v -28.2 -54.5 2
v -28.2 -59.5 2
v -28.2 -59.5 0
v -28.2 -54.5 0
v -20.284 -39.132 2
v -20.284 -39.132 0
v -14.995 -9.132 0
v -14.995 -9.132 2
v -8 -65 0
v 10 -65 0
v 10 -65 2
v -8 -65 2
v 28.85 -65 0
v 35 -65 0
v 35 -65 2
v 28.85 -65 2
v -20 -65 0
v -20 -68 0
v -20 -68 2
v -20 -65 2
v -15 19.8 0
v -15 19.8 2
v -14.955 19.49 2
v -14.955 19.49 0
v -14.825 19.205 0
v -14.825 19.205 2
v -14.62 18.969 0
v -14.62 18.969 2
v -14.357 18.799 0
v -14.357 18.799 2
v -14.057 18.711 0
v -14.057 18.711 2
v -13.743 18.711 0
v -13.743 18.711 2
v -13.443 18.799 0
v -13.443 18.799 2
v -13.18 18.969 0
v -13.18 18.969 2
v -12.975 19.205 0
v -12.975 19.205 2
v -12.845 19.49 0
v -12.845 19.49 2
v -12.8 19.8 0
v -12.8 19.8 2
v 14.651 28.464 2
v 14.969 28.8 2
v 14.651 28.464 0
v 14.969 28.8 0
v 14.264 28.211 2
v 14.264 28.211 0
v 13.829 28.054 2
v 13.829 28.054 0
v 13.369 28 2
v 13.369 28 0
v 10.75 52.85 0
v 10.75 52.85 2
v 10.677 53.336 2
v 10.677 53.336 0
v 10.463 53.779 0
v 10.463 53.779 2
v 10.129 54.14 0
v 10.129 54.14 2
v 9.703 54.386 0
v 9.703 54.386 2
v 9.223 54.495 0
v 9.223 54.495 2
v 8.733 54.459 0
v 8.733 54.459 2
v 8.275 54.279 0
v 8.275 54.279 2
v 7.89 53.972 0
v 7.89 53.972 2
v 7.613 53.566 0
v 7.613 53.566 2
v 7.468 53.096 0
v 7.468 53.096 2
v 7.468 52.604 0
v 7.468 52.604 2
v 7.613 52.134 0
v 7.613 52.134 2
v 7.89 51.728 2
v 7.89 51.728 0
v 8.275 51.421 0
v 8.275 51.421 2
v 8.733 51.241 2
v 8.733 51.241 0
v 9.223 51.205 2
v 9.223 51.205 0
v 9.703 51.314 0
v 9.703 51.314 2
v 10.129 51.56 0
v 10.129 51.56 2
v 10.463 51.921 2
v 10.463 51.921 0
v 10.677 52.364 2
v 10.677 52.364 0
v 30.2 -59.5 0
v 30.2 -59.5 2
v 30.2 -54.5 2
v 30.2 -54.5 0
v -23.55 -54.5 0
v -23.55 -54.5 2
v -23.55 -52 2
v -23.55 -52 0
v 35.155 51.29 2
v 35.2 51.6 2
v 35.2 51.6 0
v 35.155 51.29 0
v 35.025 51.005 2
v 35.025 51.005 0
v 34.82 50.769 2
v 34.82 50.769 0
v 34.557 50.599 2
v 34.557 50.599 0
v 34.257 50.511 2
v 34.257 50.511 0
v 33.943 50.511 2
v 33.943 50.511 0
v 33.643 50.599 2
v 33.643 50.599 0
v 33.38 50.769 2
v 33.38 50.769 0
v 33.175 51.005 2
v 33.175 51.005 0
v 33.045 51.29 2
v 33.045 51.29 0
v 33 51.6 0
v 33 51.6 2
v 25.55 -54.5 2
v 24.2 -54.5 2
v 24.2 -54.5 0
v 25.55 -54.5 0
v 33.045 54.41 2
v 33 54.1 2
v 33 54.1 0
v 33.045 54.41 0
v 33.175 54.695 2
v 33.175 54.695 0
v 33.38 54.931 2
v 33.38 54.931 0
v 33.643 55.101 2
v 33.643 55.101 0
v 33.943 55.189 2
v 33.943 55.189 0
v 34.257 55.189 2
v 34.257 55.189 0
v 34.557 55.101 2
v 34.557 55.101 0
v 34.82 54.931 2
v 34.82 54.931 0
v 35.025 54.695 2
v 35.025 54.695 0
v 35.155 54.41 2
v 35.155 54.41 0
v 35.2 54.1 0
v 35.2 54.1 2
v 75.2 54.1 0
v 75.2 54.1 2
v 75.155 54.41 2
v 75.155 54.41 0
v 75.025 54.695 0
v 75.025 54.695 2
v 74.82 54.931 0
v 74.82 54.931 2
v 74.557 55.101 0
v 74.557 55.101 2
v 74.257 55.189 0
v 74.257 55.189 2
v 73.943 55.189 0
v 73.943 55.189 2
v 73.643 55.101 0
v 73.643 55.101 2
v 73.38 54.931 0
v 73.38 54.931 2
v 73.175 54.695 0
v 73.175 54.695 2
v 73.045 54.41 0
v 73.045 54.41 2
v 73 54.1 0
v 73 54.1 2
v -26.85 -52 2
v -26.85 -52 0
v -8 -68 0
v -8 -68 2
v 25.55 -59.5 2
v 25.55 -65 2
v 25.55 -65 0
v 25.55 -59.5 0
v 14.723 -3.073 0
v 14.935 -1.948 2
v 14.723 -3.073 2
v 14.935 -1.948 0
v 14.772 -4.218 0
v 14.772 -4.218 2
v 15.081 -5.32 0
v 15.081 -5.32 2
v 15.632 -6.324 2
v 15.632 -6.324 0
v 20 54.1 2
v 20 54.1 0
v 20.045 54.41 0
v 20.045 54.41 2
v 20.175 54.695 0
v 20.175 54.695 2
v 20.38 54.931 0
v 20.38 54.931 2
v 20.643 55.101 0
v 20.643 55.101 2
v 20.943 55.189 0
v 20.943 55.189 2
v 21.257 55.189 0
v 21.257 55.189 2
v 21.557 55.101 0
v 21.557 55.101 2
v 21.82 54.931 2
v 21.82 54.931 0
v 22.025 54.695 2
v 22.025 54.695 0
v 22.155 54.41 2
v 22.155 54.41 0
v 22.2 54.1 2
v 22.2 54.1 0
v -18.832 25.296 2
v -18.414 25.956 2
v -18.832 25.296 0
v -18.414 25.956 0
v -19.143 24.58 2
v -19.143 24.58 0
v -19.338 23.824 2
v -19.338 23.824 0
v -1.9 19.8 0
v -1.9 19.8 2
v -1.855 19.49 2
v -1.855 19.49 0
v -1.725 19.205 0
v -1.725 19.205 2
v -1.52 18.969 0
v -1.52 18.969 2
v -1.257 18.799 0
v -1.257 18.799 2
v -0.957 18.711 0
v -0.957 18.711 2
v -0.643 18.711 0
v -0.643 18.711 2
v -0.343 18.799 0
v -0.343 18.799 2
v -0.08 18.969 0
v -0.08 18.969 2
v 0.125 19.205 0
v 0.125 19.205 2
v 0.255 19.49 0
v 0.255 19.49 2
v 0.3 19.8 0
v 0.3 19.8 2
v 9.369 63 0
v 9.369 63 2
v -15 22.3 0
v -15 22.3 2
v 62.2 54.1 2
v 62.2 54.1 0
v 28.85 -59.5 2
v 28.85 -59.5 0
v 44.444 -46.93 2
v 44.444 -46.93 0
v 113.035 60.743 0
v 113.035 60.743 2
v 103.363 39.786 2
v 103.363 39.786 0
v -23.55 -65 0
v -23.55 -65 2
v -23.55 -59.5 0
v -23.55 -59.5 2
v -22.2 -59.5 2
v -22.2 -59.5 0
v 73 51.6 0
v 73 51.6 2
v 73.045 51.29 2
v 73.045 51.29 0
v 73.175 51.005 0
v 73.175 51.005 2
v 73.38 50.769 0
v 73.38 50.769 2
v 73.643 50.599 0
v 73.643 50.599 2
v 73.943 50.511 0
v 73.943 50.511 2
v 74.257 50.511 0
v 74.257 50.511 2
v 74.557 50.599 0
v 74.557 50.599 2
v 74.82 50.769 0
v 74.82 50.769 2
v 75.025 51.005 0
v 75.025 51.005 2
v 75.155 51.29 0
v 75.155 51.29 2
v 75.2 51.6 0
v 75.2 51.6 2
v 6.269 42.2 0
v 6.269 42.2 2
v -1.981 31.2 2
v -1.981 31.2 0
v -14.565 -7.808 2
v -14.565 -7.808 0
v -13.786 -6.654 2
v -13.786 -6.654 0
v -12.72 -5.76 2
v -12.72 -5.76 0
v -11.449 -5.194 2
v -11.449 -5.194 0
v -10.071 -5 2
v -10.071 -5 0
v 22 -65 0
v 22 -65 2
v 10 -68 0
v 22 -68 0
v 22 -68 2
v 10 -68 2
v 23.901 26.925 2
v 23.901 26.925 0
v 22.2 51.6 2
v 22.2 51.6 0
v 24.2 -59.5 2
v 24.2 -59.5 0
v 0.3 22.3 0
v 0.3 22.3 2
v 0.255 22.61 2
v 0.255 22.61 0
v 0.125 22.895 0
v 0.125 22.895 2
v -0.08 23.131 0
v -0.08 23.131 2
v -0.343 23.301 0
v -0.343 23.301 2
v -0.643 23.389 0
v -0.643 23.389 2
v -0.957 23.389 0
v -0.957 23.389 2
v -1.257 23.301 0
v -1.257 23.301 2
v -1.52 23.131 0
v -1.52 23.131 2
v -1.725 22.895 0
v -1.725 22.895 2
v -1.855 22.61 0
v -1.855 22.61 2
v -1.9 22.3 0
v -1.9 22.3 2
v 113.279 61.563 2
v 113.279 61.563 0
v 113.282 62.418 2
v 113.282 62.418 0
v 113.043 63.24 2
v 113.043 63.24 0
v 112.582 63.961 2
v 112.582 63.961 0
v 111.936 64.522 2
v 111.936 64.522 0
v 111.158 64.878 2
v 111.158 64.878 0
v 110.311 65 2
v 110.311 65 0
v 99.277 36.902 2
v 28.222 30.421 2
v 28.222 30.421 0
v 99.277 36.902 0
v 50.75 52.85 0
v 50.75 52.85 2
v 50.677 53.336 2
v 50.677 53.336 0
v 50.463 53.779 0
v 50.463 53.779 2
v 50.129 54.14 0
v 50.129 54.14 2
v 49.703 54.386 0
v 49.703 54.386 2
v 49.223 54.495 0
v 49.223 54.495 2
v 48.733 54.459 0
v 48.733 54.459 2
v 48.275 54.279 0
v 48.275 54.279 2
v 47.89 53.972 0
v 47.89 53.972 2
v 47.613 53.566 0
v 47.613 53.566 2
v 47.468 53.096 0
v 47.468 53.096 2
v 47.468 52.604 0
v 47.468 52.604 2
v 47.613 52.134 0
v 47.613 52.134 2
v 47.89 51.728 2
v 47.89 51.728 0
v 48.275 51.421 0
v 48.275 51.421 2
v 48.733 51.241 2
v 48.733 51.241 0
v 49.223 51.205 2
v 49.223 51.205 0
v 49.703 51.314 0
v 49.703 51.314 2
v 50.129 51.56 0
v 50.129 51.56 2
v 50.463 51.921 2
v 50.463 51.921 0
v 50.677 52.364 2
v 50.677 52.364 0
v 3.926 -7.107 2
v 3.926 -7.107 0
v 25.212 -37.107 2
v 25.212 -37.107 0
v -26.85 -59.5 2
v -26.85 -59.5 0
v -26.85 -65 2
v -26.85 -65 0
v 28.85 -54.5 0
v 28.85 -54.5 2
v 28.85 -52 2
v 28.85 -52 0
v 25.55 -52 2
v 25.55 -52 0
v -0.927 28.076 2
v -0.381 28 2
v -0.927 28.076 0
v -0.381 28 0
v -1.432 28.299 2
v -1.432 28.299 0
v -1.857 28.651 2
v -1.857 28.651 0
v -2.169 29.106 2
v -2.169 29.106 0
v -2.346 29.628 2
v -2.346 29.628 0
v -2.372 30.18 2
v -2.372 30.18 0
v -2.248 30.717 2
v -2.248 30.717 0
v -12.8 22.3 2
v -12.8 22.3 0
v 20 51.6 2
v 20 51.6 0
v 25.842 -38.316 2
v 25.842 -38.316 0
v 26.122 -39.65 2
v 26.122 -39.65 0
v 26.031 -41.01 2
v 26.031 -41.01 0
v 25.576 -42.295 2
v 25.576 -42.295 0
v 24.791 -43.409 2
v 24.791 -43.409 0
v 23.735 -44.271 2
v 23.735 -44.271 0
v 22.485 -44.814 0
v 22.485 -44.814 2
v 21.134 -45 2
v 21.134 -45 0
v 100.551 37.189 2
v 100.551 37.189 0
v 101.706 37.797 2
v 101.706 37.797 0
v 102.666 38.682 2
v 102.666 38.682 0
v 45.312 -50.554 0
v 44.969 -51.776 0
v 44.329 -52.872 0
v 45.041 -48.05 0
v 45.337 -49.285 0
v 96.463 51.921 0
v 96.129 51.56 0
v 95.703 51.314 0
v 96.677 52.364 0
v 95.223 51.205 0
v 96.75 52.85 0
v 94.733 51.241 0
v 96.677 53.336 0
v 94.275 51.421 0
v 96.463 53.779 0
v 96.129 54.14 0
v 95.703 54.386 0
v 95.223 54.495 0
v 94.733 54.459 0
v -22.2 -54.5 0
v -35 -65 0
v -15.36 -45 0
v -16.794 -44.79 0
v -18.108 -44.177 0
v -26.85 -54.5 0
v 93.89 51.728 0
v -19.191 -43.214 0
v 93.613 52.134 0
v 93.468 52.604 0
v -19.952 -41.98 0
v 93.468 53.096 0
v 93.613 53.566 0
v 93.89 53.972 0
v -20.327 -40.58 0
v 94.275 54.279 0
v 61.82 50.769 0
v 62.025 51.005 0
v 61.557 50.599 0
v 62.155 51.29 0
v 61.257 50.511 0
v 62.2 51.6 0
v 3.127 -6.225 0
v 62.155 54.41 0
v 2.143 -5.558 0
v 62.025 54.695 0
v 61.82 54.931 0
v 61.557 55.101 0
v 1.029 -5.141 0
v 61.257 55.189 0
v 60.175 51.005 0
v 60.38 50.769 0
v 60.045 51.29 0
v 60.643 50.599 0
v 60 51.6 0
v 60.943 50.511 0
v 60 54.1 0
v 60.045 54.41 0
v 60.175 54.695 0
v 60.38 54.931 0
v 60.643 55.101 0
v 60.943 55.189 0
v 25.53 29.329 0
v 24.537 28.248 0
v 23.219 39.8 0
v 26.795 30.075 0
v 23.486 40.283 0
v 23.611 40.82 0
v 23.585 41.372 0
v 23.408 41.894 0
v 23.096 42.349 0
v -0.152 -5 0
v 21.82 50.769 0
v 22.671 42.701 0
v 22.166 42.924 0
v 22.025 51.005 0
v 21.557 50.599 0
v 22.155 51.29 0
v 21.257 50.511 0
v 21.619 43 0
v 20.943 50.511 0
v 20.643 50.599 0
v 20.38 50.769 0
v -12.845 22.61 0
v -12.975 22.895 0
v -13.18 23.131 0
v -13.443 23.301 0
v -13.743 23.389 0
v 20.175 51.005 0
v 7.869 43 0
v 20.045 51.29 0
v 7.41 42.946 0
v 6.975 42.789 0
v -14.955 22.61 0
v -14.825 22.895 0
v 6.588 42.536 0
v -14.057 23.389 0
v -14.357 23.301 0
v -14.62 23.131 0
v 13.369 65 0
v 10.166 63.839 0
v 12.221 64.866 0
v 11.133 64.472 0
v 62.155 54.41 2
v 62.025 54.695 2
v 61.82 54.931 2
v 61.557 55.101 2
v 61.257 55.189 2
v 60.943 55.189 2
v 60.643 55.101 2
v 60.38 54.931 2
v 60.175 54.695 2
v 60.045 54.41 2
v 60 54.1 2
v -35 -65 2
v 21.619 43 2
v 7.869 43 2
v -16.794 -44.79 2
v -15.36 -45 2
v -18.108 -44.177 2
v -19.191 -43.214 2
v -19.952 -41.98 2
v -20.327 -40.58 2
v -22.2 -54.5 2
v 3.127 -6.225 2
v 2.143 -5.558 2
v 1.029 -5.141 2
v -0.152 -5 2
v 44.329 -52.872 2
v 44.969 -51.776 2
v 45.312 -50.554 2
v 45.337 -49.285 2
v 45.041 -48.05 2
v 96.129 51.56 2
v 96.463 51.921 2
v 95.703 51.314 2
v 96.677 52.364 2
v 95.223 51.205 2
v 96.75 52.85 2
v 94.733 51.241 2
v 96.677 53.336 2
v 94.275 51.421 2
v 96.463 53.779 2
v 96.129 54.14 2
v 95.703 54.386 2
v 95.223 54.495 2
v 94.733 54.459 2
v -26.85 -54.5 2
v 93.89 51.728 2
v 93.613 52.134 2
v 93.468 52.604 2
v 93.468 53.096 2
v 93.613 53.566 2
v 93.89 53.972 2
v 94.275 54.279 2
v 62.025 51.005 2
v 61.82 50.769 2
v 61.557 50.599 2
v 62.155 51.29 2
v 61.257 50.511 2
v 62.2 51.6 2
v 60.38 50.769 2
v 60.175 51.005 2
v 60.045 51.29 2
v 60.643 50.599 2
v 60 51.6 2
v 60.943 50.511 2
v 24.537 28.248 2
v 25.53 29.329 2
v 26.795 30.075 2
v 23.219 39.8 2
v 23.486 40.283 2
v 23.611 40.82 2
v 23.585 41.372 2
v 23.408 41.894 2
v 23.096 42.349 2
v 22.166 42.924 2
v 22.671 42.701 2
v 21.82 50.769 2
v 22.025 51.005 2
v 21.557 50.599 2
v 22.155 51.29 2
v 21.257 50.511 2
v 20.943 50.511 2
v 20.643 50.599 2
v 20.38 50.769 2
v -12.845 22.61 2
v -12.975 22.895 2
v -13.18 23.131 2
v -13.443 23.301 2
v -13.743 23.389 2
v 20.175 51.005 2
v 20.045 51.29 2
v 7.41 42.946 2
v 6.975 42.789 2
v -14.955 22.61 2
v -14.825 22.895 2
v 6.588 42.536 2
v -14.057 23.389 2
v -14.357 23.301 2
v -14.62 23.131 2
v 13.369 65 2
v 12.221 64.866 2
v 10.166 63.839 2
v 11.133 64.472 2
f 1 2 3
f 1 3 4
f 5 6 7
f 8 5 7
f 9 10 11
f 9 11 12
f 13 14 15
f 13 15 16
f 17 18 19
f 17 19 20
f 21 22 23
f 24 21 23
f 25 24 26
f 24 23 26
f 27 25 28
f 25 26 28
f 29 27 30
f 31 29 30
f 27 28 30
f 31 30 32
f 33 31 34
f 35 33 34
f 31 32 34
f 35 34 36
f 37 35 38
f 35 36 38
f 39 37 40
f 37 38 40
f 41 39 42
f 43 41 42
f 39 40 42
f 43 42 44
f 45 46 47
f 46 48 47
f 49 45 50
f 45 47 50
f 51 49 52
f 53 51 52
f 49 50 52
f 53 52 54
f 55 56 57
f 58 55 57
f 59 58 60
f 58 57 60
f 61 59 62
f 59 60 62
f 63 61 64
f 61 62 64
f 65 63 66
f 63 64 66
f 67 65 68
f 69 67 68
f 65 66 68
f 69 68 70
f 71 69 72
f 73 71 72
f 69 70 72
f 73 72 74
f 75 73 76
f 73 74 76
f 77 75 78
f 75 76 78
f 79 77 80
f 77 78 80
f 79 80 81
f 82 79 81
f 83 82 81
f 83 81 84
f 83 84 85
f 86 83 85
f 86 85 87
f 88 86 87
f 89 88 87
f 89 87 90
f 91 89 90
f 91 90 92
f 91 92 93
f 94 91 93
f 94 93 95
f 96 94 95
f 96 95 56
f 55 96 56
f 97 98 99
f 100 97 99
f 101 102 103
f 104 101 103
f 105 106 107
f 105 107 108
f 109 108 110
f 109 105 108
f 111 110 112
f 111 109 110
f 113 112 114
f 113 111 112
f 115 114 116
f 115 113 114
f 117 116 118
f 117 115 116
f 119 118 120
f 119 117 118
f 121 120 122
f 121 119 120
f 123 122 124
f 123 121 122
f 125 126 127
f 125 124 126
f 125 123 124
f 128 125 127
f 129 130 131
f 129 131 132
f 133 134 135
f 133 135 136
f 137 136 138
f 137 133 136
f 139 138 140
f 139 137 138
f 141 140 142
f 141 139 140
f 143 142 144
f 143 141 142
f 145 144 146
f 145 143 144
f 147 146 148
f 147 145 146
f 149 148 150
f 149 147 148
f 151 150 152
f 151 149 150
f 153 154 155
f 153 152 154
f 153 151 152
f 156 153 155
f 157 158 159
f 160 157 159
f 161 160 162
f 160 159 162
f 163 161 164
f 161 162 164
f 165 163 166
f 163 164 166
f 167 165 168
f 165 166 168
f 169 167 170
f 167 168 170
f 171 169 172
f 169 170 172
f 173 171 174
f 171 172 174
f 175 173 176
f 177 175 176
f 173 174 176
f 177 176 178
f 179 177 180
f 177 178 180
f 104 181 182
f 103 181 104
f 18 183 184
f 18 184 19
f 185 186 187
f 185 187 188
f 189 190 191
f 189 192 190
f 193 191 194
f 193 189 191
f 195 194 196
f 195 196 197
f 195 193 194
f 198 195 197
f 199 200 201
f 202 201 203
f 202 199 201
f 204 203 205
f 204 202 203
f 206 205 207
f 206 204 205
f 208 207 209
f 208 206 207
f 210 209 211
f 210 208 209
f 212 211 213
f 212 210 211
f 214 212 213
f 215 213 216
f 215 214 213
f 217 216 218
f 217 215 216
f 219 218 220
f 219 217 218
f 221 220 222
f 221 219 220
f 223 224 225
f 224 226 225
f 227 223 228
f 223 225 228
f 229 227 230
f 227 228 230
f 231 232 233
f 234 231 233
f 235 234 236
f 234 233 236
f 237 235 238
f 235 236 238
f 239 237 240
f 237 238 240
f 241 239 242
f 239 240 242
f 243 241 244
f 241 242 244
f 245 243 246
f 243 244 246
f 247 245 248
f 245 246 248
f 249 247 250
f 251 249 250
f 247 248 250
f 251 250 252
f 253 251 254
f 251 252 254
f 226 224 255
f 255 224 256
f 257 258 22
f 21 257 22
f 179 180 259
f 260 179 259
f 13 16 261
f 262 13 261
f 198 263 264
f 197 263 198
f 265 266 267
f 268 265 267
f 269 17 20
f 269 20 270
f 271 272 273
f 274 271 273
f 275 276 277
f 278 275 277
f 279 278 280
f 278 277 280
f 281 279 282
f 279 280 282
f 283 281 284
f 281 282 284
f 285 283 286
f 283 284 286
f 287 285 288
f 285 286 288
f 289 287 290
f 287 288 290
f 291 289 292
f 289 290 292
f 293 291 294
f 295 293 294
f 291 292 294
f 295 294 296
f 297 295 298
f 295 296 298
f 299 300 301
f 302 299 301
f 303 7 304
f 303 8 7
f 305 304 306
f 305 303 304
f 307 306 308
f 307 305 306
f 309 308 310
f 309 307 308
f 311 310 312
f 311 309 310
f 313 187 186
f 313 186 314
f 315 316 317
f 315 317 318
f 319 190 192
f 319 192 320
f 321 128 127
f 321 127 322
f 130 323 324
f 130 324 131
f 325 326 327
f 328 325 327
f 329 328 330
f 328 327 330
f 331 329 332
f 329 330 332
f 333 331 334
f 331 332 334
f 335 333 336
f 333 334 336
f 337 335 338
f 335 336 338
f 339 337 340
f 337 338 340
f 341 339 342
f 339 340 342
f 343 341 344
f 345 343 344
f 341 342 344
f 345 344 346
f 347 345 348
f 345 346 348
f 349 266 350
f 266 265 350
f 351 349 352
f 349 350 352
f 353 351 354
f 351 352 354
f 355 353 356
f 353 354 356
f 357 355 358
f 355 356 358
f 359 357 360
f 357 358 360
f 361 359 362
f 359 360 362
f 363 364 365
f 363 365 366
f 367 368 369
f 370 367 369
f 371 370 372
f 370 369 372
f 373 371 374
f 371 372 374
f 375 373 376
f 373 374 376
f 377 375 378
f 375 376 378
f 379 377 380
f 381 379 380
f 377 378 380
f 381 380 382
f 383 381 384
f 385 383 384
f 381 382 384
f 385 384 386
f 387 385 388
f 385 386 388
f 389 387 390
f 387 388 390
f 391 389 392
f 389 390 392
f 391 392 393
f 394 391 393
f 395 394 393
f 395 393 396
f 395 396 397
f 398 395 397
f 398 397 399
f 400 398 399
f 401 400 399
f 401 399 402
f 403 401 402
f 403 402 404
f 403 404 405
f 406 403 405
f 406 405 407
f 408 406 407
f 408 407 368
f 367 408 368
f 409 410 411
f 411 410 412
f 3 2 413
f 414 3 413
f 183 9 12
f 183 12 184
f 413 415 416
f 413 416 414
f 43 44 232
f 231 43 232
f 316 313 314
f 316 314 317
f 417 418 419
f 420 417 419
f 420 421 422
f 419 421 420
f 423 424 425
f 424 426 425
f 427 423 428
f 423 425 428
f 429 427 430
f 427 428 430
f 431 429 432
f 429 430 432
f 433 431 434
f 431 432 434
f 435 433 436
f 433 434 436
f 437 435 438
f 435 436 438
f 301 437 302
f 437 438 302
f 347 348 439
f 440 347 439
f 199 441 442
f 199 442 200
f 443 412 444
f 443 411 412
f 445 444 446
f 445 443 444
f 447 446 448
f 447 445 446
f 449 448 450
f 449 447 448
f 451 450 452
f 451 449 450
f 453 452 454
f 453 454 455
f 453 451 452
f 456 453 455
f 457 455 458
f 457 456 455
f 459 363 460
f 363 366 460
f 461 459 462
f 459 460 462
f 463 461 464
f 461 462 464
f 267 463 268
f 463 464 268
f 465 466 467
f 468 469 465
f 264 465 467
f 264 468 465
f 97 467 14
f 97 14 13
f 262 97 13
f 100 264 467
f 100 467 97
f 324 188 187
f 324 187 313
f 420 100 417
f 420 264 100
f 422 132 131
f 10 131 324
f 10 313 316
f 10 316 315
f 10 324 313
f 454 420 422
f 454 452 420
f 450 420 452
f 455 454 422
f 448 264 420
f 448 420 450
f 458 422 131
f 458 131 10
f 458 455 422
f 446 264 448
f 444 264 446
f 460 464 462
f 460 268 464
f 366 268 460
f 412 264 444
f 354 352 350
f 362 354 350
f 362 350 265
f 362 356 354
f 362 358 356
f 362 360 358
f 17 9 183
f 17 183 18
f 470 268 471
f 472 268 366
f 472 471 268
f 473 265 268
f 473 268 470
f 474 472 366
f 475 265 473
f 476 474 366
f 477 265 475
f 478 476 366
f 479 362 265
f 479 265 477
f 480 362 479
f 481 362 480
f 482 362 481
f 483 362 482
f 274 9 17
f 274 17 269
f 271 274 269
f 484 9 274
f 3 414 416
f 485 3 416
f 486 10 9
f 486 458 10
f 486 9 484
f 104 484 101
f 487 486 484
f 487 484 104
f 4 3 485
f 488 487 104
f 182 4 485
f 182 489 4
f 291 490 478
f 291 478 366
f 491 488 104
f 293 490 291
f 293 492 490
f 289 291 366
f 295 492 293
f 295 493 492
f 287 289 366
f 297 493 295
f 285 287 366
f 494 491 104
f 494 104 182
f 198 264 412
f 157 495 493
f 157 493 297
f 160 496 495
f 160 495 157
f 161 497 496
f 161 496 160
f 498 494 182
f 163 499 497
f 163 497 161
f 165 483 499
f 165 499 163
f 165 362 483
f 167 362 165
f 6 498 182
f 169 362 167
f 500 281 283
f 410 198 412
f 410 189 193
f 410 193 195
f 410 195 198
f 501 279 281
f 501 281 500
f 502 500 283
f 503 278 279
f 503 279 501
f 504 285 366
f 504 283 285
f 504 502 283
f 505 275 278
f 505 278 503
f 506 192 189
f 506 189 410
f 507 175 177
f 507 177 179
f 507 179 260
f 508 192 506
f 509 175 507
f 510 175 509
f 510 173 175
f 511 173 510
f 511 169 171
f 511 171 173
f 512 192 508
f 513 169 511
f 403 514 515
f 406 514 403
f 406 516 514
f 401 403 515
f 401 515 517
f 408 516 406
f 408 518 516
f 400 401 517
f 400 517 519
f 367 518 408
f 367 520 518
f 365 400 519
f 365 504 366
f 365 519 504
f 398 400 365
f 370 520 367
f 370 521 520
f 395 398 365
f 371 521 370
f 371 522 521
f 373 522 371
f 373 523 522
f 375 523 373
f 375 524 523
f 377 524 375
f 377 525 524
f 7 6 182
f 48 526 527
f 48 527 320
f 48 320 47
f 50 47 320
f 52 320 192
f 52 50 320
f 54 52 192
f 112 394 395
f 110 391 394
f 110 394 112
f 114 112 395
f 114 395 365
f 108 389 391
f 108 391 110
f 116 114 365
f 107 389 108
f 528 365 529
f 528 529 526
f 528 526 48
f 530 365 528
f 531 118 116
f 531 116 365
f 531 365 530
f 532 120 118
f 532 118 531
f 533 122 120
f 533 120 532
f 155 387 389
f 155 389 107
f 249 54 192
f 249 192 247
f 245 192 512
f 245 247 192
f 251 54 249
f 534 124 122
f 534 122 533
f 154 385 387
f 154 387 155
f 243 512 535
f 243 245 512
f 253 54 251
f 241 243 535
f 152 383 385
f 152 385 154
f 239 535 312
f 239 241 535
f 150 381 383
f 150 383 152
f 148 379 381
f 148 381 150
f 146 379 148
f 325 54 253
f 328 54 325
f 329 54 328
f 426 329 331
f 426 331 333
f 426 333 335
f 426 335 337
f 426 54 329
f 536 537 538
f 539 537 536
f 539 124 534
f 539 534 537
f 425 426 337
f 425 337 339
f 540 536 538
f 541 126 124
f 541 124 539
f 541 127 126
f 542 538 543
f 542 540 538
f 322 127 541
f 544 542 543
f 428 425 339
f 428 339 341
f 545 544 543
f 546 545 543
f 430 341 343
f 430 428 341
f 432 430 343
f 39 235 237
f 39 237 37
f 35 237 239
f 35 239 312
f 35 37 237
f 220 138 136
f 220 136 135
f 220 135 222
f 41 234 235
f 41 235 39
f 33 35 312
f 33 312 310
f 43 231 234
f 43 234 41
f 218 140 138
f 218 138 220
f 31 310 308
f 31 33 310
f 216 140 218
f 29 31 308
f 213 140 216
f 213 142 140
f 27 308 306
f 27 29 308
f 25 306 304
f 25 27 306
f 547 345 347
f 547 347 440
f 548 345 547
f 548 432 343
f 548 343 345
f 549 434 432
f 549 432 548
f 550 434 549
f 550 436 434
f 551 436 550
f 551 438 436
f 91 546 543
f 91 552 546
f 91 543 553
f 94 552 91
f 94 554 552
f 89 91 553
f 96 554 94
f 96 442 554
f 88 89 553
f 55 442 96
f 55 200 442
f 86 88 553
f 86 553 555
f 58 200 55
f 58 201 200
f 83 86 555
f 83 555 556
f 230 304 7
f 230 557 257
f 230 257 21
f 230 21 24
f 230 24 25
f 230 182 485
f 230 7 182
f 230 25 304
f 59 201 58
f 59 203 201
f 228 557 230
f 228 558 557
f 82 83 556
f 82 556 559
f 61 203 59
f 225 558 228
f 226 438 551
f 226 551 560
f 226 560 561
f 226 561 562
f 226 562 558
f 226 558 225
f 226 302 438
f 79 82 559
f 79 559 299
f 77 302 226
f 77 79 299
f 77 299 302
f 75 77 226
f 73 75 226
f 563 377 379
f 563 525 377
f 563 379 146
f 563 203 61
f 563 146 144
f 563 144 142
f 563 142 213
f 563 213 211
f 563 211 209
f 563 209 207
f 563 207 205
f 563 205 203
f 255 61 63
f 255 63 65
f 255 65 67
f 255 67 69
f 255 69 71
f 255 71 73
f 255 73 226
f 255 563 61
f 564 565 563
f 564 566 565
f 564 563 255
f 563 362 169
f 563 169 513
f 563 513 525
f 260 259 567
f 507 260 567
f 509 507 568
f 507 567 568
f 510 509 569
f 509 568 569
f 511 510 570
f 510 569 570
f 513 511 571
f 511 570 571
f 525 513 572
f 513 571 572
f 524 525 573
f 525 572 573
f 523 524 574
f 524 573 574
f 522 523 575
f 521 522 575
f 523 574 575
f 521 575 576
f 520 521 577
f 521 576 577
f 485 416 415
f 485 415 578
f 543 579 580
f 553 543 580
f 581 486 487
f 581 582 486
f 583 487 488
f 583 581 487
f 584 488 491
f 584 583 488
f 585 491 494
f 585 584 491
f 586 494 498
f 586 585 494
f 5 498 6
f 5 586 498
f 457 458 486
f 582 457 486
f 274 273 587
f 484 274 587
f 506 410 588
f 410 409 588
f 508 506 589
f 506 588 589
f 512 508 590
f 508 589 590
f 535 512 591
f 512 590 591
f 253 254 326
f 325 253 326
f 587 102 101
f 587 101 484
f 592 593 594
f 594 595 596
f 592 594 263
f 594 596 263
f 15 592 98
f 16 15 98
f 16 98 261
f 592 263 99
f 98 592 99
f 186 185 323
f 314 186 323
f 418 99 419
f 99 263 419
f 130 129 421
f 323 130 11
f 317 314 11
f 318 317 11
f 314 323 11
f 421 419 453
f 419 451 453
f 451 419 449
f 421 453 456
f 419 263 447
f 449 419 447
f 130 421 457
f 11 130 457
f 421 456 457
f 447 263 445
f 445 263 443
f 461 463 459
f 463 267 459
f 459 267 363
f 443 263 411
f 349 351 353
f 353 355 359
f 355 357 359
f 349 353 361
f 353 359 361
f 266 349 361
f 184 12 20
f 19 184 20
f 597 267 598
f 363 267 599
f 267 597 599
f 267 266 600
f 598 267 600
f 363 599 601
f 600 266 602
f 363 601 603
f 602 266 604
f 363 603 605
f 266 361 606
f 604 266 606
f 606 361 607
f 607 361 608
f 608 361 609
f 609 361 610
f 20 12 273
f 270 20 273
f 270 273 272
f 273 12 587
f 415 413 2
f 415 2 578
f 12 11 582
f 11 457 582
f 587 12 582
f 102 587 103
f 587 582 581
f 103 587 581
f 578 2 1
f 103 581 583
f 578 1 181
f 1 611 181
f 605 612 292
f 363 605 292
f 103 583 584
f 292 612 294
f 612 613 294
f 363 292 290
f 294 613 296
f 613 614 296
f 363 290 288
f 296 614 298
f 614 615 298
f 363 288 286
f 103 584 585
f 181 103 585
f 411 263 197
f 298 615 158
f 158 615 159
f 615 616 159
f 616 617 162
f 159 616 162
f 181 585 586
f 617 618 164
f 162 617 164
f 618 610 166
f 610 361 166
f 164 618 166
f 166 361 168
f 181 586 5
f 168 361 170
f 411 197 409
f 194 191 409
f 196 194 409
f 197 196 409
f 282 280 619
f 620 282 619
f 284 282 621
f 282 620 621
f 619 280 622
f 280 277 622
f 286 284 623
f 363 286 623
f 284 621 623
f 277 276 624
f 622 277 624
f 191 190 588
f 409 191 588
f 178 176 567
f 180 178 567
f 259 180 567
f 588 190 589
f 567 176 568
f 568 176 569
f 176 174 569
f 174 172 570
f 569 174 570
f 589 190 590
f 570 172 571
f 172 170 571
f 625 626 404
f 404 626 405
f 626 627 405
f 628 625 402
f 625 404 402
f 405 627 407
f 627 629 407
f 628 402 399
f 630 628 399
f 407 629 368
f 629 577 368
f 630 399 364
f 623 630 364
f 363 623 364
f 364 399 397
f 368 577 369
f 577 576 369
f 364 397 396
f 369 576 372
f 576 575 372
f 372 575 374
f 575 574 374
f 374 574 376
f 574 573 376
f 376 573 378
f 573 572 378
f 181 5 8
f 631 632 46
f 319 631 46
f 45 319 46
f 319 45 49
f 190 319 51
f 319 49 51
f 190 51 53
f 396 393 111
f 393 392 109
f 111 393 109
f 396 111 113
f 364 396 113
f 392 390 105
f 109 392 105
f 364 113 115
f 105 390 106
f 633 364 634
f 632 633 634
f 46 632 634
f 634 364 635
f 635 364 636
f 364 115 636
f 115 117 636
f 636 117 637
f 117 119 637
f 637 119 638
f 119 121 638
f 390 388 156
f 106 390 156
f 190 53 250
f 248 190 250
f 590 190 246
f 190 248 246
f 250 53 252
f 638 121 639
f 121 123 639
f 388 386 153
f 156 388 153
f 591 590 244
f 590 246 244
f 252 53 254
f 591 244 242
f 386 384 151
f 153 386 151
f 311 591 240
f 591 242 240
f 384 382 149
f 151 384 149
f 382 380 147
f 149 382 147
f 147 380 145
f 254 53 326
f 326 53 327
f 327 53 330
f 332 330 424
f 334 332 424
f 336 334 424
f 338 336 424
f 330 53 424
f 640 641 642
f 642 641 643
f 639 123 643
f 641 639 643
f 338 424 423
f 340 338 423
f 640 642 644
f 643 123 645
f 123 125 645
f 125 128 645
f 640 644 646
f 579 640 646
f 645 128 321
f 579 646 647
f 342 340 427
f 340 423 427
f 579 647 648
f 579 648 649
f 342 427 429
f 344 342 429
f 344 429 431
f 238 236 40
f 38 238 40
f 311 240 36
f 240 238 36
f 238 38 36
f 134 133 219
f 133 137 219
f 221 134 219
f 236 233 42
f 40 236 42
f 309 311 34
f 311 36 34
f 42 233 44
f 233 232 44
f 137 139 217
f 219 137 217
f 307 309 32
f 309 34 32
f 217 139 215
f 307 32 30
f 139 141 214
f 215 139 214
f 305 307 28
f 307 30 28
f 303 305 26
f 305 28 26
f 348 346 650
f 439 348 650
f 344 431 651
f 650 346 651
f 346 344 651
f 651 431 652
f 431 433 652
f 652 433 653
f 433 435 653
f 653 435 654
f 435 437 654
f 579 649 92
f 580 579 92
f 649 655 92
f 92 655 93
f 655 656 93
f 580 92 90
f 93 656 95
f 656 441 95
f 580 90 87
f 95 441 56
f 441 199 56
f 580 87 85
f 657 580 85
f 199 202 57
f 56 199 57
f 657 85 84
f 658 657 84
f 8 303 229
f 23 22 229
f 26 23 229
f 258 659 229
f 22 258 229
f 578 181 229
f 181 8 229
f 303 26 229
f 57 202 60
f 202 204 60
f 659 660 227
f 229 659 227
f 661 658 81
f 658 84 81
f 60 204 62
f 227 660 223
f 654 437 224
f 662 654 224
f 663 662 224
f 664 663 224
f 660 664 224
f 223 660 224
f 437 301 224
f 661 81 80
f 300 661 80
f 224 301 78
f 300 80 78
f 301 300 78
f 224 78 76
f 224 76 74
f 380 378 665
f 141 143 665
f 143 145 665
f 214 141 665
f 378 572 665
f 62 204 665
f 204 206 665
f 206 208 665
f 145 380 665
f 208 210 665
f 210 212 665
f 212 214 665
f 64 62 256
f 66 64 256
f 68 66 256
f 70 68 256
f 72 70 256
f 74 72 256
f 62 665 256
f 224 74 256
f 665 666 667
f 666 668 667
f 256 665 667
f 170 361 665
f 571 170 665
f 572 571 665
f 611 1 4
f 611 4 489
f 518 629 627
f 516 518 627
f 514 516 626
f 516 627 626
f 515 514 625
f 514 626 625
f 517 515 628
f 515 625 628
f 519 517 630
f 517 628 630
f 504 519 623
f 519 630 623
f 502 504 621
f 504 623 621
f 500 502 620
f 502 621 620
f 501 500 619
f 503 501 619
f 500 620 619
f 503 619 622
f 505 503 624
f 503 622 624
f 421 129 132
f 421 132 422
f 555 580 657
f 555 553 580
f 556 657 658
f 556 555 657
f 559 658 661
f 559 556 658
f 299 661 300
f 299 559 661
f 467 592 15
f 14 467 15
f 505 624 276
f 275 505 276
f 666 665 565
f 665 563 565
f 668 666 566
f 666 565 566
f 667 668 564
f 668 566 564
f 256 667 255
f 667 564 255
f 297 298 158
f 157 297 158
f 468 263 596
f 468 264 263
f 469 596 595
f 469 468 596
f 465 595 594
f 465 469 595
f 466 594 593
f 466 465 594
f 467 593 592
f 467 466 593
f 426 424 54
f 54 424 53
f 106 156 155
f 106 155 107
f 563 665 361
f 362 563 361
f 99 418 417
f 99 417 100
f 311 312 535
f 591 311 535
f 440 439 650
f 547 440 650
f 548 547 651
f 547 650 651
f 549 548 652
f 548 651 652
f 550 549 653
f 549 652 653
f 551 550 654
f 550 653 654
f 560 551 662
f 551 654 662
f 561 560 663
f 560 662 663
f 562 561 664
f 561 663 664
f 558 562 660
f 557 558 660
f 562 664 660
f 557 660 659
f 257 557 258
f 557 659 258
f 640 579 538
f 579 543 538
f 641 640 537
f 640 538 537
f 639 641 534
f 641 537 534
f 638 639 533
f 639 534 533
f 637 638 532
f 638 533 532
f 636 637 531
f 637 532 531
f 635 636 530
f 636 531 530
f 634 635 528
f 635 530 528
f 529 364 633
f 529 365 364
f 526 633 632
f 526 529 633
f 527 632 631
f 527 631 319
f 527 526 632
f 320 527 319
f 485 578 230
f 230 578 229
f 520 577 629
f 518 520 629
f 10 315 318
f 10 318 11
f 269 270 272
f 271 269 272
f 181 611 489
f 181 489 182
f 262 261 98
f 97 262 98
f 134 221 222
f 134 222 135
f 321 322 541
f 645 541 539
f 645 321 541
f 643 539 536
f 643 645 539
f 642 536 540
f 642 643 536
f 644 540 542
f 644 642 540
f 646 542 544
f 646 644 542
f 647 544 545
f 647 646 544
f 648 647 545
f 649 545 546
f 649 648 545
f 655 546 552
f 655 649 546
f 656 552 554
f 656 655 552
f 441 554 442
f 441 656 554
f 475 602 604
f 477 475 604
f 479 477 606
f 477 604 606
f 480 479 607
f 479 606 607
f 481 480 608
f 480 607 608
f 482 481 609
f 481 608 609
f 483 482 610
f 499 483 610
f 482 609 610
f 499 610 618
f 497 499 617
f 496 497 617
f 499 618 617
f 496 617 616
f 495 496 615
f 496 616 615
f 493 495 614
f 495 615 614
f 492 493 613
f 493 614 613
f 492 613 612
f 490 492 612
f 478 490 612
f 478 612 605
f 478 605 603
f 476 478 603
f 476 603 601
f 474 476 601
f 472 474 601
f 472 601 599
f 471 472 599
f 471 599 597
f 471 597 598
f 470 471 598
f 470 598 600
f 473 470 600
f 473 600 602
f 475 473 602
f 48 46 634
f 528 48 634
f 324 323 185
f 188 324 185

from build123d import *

# Parameters (mm, degrees)
EXTRUDE_1_DEPTH      = 2
CUT_EXTRUDE_1_DEPTH  = 2
EXTRUDE_2_DEPTH      = 2
SKETCH_6_W           = 3.3
SKETCH_6_H           = 13
CUT_EXTRUDE_3_DEPTH  = 2
SKETCH_7_W           = 6
SKETCH_7_H           = 5
CUT_EXTRUDE_4_DEPTH  = 2
CUT_EXTRUDE_5_DEPTH  = 2
CUT_EXTRUDE_7_DEPTH  = 10
CUT_EXTRUDE_9_DEPTH  = 10
FILLET_1_R           = 5
CUT_EXTRUDE_10_DEPTH = 50
SKETCH_13_R          = 1.65
CUT_EXTRUDE_11_DEPTH = 50
FILLET_2_R           = 5
CUT_EXTRUDE_13_DEPTH = 50
FILLET_4_R           = 2
FILLET_5_R           = 3


with BuildPart() as part:
    # 草图1 → 凸台-拉伸1 (new body)
    with BuildSketch(Plane.XY):
        Polygon((-20, -65), (-35, -65), (-35, 65), (35, 65), (35, -65), (22, -65), (22, -68), (10, -68), (10, -65), (-8, -65), (-8, -68), (-20, -68), align=None)
    extrude(amount=EXTRUDE_1_DEPTH)

    # 草图2 → 切除-拉伸1 (cut)
    with BuildSketch(Plane.XY.offset(2)):
        Polygon((-35, -65), (-19.130571736, 25), (10.869428264, 65), (-35, 65), align=None)
    extrude(amount=-CUT_EXTRUDE_1_DEPTH, mode=Mode.SUBTRACT)

    # 草图3 → 凸台-拉伸2 (add)
    with BuildSketch(Plane.XY.offset(2)):
        Polygon((35, 65), (115, 65), (85, 0), (35, -65), align=None)
    extrude(amount=-EXTRUDE_2_DEPTH)

    # 草图6 → 切除-拉伸3 (cut)
    with BuildSketch(Plane.XY.offset(2)):
        with Locations((-25.2, -58.5)):
            Rectangle(SKETCH_6_W, SKETCH_6_H)
        with Locations((27.2, -58.5)):
            Rectangle(SKETCH_6_W, SKETCH_6_H)
    extrude(amount=-CUT_EXTRUDE_3_DEPTH, mode=Mode.SUBTRACT)

    # 草图7 → 切除-拉伸4 (cut)
    with BuildSketch(Plane.XY.offset(2)):
        with Locations((-25.2, -57)):
            Rectangle(SKETCH_7_W, SKETCH_7_H)
        with Locations((27.2, -57)):
            Rectangle(SKETCH_7_W, SKETCH_7_H)
    extrude(amount=-CUT_EXTRUDE_4_DEPTH, mode=Mode.SUBTRACT)

    # 草图8 → 切除-拉伸5 (cut)
    with BuildSketch(Plane.XY.offset(2)):
        Polygon((46.581829906, -49.943621123), (14.201899011, -4.308455167), (24.89214771, 30.117769456), (102.152743187, 37.164276905), (85, 0), align=None)
    extrude(amount=-CUT_EXTRUDE_5_DEPTH, mode=Mode.SUBTRACT)

    # 草图9 → 切除-拉伸7 (cut)
    with BuildSketch(Plane.XY.offset(2)):
        with BuildLine():
            Line((-12.8, 19.8), (-1.9, 19.8))
            ThreePointArc((-1.9, 19.8), (-0.8, 18.7), (0.3, 19.8))
            Line((0.3, 19.8), (0.3, 22.3))
            ThreePointArc((0.3, 22.3), (-0.8, 23.4), (-1.9, 22.3))
            Line((-1.9, 22.3), (-12.8, 22.3))
            ThreePointArc((-12.8, 22.3), (-13.9, 23.4), (-15, 22.3))
            Line((-15, 22.3), (-15, 19.8))
            ThreePointArc((-15, 19.8), (-13.9, 18.7), (-12.8, 19.8))
        make_face()
    extrude(amount=-CUT_EXTRUDE_7_DEPTH, mode=Mode.SUBTRACT)

    # 草图11 → 切除-拉伸9 (cut)
    with BuildSketch(Plane(origin=(0, 0, 0), x_dir=(-1, 0, 0), z_dir=(0, 0, -1))):
        Polygon((-2.431069725, -5), (-30.812630494, -45), (21.319194267, -45), (14.266115039, -5), align=None)
    extrude(amount=-CUT_EXTRUDE_9_DEPTH, mode=Mode.SUBTRACT)

    # 圆角1
    fillet_1_edges = [part.edges().sort_by_distance(p)[0] for p in [
        (46.581829906, -49.943621123, 1),
        (14.201899011, -4.308455167, 1),
        (24.89214771, 30.117769456, 1),
        (2.431069725, -5, 1),
        (-14.266115039, -5, 1),
        (-21.319194267, -45, 1),
        (30.812630494, -45, 1),
    ]]
    fillet(fillet_1_edges, radius=FILLET_1_R)

    # 草图12 → 切除-拉伸10 (cut)
    with BuildSketch(Plane.XY.offset(2)):
        with BuildLine():
            Line((22.2, 54.1), (33, 54.1))
            ThreePointArc((33, 54.1), (34.1, 55.2), (35.2, 54.1))
            Line((35.2, 54.1), (35.2, 51.6))
            ThreePointArc((35.2, 51.6), (34.1, 50.5), (33, 51.6))
            Line((33, 51.6), (22.2, 51.6))
            ThreePointArc((22.2, 51.6), (21.1, 50.5), (20, 51.6))
            Line((20, 51.6), (20, 54.1))
            ThreePointArc((20, 54.1), (21.1, 55.2), (22.2, 54.1))
        make_face()
        with BuildLine():
            Line((62.2, 51.6), (73, 51.6))
            ThreePointArc((73, 51.6), (74.1, 50.5), (75.2, 51.6))
            Line((75.2, 51.6), (75.2, 54.1))
            ThreePointArc((75.2, 54.1), (74.1, 55.2), (73, 54.1))
            Line((73, 54.1), (62.2, 54.1))
            ThreePointArc((62.2, 54.1), (61.1, 55.2), (60, 54.1))
            Line((60, 54.1), (60, 51.6))
            ThreePointArc((60, 51.6), (61.1, 50.5), (62.2, 51.6))
        make_face()
    extrude(amount=-CUT_EXTRUDE_10_DEPTH, mode=Mode.SUBTRACT)

    # 草图13 → 切除-拉伸11 (cut)
    with BuildSketch(Plane.XY.offset(2)):
        with Locations((9.1, 52.85)):
            Circle(SKETCH_13_R)
        with Locations((49.1, 52.85)):
            Circle(SKETCH_13_R)
        with Locations((95.1, 52.85)):
            Circle(SKETCH_13_R)
    extrude(amount=-CUT_EXTRUDE_11_DEPTH, mode=Mode.SUBTRACT)

    # 圆角2
    fillet_2_edges = [part.edges().sort_by_distance(p)[0] for p in [
        (102.152743187, 37.164276905, 1),
        (10.869428264, 65, 1),
        (-19.130571736, 25, 1),
    ]]
    fillet(fillet_2_edges, radius=FILLET_2_R)

    # 草图15 → 切除-拉伸13 (cut)
    with BuildSketch(Plane.XY.offset(2)):
        Polygon((6.869428264, 43), (-4.380571736, 28), (14.369428264, 28), (25.619428264, 43), align=None)
    extrude(amount=-CUT_EXTRUDE_13_DEPTH, mode=Mode.SUBTRACT)

    # 圆角4
    fillet_4_edges = [part.edges().sort_by_distance(p)[0] for p in [
        (6.869428264, 43, 1),
        (25.619428264, 43, 1),
        (14.369428264, 28, 1),
        (-4.380571736, 28, 1),
    ]]
    fillet(fillet_4_edges, radius=FILLET_4_R)

    # 圆角5
    fillet_5_edges = [part.edges().sort_by_distance(p)[0] for p in [
        (115, 65, 1),
    ]]
    fillet(fillet_5_edges, radius=FILLET_5_R)


solid = part.part
